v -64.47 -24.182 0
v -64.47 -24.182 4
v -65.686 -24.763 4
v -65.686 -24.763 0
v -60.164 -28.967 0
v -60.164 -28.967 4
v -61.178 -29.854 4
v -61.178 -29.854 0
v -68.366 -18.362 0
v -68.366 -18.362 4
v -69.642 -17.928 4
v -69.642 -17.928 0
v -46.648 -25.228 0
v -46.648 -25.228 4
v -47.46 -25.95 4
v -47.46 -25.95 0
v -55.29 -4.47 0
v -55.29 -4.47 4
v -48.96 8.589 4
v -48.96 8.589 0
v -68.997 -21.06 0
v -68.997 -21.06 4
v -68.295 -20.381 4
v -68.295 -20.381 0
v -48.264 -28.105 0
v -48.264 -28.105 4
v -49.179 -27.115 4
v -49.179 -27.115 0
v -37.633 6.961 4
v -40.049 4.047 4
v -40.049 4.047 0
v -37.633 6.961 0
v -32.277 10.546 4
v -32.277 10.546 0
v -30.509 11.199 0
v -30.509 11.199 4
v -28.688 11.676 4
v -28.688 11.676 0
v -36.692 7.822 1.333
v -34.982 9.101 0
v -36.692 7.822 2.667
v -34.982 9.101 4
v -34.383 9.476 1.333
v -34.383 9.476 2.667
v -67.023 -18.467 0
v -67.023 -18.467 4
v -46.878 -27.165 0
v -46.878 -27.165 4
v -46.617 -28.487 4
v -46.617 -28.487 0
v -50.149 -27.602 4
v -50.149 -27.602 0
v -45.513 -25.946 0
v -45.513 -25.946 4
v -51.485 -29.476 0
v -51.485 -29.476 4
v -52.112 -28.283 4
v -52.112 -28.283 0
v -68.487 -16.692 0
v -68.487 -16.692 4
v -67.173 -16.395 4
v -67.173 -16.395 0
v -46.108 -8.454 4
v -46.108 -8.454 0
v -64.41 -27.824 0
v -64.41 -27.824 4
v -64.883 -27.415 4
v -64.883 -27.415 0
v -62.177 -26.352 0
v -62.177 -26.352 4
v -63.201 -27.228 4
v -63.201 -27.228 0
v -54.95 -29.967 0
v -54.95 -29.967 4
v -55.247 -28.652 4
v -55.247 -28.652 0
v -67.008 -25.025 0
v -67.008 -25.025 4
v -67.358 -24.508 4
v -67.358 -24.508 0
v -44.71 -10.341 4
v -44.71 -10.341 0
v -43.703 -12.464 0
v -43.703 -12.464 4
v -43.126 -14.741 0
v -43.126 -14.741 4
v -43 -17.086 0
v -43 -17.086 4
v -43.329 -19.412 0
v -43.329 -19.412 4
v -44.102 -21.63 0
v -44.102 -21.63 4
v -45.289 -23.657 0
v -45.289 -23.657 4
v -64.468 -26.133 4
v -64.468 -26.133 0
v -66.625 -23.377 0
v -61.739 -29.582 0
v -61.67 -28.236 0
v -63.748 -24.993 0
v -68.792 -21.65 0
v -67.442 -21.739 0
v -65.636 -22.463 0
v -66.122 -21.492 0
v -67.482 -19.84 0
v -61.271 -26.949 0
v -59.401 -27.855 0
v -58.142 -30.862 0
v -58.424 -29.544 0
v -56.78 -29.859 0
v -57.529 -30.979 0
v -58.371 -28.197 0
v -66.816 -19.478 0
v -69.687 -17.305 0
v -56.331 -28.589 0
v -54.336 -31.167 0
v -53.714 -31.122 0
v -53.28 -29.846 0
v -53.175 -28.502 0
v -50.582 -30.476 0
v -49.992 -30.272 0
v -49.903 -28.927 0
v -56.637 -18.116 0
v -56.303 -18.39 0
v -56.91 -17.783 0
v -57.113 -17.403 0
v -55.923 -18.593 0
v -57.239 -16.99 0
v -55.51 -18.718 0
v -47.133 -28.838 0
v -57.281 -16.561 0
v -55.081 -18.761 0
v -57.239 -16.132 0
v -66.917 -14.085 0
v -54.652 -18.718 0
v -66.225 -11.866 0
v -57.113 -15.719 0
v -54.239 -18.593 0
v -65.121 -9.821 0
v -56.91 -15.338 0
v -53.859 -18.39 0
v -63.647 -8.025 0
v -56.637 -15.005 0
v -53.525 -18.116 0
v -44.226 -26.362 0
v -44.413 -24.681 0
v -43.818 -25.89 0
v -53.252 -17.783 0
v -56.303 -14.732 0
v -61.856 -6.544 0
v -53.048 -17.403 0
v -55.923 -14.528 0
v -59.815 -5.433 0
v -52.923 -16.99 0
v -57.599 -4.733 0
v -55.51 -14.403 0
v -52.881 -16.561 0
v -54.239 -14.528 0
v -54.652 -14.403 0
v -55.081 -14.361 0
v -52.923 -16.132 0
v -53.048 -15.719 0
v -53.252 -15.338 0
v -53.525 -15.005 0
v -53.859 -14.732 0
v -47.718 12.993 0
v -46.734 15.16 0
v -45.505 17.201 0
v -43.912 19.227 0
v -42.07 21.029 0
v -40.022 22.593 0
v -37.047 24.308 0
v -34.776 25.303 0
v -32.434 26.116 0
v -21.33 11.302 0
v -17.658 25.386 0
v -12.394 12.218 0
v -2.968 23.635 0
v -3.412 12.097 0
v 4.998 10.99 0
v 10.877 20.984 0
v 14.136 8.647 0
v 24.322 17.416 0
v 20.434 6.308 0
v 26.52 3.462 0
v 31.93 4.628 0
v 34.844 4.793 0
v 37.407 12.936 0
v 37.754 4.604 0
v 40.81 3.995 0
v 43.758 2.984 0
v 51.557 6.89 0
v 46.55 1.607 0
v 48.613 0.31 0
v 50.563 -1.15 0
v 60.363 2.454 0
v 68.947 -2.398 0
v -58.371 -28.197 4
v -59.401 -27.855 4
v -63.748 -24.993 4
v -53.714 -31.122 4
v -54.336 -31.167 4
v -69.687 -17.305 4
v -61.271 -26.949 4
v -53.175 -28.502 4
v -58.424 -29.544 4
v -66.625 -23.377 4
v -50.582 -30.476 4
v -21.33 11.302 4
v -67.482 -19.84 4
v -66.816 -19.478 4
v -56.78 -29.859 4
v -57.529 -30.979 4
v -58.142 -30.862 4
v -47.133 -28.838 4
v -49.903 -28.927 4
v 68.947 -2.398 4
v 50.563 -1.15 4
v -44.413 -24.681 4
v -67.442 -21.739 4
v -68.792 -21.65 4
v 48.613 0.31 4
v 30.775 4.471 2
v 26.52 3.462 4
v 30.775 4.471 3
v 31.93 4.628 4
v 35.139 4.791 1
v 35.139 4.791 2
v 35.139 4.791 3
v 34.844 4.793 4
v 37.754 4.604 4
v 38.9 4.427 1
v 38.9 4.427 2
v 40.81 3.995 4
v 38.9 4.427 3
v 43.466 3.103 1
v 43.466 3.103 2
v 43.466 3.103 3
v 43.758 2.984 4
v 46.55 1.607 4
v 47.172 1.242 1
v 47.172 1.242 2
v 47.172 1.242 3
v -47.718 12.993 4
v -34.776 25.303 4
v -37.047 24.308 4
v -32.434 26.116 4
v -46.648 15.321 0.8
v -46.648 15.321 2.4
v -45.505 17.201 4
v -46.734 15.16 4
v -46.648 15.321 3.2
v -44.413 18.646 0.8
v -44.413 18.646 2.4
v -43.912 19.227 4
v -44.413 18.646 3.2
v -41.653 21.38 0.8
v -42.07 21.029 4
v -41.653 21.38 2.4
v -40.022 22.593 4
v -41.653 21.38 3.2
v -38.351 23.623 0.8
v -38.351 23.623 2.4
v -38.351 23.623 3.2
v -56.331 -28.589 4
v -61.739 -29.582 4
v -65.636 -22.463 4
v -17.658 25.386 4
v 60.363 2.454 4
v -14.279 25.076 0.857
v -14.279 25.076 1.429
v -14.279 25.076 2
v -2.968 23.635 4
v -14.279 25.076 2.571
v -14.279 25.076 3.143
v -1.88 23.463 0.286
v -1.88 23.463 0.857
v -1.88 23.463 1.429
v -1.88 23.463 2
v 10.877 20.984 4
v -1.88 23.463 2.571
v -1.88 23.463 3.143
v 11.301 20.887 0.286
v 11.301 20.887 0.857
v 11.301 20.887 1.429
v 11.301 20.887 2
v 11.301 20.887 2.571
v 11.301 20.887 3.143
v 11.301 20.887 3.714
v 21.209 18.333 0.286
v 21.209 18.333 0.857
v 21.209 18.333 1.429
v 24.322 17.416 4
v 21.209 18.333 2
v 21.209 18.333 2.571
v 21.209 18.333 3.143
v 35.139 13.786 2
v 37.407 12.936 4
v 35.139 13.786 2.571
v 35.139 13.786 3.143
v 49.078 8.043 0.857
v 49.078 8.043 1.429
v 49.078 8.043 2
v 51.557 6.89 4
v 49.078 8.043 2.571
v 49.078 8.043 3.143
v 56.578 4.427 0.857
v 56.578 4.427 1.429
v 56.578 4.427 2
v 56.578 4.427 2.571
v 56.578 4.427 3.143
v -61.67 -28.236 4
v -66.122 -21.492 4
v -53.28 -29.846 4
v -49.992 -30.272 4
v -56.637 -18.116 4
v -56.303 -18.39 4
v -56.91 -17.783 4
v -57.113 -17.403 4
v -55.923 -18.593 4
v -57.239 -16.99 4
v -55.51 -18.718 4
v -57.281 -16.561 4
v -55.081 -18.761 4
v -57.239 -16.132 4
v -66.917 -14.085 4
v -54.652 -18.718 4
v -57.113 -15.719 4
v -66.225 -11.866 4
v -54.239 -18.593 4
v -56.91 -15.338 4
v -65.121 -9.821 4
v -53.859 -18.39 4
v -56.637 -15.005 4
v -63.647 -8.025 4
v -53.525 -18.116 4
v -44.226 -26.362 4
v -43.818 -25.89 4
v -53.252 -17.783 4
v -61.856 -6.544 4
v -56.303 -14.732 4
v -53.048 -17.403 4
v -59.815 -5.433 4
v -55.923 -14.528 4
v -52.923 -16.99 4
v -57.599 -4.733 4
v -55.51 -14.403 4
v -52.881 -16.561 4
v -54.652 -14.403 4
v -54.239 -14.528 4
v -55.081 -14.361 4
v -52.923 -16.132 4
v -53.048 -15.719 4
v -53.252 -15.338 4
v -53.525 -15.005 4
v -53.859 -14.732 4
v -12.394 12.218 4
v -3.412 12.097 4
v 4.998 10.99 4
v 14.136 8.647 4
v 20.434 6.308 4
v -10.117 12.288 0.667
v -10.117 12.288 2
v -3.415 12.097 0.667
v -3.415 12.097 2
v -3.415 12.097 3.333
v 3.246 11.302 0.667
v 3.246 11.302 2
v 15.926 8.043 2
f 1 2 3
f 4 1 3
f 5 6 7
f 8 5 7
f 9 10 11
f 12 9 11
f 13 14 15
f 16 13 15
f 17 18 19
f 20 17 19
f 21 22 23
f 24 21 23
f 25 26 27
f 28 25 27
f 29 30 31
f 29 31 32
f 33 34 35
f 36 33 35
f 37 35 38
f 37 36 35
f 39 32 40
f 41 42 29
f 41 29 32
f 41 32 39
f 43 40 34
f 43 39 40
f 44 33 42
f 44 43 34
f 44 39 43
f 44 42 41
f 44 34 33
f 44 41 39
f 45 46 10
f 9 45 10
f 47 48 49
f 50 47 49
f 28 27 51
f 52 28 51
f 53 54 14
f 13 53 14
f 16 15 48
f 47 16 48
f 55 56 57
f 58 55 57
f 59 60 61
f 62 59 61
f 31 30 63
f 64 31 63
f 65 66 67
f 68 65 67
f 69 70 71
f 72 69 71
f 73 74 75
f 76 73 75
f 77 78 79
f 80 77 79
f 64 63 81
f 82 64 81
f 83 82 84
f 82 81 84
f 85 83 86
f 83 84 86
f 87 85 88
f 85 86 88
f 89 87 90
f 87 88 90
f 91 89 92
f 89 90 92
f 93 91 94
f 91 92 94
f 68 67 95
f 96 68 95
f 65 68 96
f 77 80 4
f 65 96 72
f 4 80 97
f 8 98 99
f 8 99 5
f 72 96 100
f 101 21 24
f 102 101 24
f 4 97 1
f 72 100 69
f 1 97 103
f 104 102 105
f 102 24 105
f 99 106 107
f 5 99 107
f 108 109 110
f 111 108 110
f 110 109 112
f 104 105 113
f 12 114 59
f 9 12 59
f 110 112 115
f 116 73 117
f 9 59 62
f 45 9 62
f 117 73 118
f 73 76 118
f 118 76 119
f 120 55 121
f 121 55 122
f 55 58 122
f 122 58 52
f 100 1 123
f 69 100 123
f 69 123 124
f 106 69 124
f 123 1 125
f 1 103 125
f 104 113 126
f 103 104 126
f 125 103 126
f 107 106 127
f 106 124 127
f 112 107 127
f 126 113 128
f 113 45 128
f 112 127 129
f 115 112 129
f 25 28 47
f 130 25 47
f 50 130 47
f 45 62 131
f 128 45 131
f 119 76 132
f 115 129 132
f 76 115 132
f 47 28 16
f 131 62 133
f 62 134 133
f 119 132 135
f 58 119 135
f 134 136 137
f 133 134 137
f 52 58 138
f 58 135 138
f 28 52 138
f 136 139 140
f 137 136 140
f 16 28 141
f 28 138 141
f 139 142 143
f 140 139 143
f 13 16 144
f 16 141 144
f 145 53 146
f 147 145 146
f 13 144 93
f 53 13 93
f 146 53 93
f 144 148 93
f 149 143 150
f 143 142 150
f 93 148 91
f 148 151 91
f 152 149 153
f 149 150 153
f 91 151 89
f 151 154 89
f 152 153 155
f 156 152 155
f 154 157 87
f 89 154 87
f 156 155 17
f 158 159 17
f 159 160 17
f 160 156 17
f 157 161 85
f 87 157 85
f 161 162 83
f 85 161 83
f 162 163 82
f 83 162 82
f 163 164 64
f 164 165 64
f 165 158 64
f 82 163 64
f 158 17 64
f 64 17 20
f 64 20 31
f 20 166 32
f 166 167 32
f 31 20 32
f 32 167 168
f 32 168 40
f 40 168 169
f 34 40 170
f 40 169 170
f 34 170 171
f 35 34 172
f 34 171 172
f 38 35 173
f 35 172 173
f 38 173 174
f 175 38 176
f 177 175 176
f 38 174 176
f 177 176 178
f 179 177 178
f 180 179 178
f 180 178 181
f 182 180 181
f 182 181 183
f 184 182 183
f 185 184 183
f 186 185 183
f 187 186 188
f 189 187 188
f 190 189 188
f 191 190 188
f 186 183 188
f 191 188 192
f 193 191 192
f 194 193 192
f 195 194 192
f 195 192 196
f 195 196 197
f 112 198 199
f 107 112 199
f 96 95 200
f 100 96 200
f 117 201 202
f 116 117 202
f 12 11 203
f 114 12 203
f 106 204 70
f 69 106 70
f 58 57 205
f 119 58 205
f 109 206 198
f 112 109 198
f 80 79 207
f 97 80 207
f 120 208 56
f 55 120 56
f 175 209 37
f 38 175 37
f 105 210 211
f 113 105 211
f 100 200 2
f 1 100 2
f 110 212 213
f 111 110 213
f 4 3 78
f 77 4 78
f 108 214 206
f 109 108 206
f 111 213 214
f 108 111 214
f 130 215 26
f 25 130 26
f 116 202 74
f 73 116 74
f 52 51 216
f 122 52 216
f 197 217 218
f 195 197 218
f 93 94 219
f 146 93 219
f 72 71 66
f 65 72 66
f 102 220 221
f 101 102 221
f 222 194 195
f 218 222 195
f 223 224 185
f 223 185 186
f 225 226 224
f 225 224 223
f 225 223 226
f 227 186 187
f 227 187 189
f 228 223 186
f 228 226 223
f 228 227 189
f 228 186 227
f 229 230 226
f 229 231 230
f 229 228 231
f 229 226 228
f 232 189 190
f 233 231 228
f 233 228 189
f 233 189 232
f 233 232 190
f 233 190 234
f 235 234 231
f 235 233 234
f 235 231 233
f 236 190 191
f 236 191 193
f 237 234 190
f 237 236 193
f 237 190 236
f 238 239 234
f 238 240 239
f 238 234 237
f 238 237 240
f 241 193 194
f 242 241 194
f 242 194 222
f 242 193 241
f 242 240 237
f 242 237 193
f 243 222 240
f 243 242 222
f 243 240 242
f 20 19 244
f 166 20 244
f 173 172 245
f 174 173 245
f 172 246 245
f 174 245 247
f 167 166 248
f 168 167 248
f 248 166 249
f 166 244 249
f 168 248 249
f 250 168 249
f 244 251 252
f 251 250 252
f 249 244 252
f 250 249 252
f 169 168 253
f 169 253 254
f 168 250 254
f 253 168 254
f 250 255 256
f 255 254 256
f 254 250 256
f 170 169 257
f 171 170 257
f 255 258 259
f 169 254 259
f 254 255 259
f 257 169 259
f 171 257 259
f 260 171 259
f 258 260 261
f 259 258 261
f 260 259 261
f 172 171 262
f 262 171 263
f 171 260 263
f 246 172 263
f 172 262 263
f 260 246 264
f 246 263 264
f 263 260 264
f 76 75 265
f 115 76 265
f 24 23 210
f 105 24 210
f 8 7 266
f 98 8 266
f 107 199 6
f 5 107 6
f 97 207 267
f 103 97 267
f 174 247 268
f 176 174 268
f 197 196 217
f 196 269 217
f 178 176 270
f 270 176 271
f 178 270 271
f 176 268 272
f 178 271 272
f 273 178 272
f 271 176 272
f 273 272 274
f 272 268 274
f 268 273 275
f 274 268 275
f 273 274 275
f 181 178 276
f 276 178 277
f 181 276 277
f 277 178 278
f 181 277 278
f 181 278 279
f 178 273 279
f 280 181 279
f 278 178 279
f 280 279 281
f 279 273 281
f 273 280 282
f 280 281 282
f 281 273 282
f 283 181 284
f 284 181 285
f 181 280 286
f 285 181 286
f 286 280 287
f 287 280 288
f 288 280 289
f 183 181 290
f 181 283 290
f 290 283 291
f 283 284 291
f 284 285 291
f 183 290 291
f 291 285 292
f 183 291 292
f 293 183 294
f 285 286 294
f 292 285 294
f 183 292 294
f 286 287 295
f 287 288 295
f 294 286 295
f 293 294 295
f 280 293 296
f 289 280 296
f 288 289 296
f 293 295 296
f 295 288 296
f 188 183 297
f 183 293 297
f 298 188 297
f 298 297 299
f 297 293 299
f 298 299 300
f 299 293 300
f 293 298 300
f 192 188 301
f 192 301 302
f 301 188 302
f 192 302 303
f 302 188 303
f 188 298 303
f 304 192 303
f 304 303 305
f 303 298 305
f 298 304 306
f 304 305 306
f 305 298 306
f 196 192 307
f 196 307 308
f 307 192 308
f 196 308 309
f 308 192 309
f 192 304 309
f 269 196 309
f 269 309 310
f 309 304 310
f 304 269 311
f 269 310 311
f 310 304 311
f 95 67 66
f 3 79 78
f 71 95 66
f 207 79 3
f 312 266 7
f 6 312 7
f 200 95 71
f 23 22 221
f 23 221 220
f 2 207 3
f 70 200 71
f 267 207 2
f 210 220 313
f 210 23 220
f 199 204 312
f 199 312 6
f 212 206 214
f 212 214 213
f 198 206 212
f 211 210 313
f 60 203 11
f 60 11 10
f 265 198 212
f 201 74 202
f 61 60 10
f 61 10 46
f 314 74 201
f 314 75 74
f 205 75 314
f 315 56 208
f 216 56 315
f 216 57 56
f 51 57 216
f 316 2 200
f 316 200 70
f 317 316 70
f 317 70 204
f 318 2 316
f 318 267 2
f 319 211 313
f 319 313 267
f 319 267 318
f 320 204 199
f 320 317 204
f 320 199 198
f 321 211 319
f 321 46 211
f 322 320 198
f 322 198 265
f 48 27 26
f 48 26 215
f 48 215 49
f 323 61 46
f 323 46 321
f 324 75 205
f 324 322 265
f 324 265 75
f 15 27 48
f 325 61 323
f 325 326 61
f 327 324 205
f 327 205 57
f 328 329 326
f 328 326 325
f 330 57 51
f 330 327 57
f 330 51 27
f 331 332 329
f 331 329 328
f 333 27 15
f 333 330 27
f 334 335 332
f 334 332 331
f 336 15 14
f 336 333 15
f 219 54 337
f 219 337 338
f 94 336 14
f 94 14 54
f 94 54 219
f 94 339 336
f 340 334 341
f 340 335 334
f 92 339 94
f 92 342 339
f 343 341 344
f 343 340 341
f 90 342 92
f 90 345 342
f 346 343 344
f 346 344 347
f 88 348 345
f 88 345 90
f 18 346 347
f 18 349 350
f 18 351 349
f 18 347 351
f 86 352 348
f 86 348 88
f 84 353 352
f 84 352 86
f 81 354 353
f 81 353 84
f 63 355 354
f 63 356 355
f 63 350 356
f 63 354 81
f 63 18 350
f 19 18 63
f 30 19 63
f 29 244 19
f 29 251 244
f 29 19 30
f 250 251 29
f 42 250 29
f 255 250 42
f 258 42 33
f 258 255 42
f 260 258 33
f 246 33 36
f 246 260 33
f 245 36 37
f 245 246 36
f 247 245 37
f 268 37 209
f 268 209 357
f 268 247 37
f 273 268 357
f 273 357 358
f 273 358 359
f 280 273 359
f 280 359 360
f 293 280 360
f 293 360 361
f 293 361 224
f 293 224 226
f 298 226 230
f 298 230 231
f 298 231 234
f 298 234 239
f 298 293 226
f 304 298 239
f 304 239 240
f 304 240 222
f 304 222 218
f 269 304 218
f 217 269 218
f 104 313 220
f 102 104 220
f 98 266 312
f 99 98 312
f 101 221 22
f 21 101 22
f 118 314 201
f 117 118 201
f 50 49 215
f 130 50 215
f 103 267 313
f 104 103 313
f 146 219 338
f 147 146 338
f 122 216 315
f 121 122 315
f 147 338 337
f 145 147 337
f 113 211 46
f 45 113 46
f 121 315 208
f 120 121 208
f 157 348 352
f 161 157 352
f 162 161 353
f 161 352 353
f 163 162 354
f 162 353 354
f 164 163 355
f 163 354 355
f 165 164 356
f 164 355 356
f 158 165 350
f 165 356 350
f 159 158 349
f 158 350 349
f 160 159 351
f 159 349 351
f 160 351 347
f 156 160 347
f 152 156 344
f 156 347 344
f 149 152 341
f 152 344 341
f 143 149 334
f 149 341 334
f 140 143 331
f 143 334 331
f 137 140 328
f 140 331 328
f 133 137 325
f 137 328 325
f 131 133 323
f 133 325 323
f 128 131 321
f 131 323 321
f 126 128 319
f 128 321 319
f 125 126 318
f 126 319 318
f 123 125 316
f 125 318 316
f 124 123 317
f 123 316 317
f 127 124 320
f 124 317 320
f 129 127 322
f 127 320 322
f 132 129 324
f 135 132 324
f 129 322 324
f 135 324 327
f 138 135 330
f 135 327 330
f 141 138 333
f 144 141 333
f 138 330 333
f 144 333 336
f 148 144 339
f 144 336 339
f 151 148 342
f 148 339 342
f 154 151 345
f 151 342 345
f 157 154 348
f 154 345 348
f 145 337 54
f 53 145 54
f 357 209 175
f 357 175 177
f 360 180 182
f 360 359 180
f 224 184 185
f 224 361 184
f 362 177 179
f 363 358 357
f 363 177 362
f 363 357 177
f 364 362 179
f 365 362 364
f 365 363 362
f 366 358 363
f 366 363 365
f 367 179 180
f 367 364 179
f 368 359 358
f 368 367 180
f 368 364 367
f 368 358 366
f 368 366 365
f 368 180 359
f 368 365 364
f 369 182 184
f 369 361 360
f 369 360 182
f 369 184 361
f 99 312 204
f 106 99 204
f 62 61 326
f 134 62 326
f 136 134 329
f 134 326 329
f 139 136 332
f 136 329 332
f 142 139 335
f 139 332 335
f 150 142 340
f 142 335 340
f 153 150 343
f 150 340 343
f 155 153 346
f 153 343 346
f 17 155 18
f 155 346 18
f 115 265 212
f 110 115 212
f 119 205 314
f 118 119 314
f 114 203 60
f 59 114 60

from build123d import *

# Parameters (mm, degrees)
SKETCH1_W           = 150
SKETCH1_H           = 70
BOSS_EXTRUDE2_DEPTH = 4
SKETCH3_W           = 150
SKETCH3_H           = 70
SKETCH3_R           = 2.2
CUT_EXTRUDE2_DEPTH  = 4


with BuildPart() as part:
    # Sketch1 → Boss-Extrude2 (new body)
    with BuildSketch(Plane.XY):
        Rectangle(SKETCH1_W, SKETCH1_H)
    extrude(amount=BOSS_EXTRUDE2_DEPTH)

    # Sketch3 → Cut-Extrude2 (cut)
    # profile 1 of 2: a face of its own
    with BuildSketch(Plane.XY.offset(4)):
        Rectangle(SKETCH3_W, SKETCH3_H)
        with BuildLine():
            Line((-40.048699904, 4.047442221), (-46.108056892, -8.453831345))
            ThreePointArc((-46.108056892, -8.453831345), (-43.005686407, -15.910387786), (-45.28923235, -23.657022831))
            Line((-45.28923235, -23.657022831), (-44.413257795, -24.68114801))
            Line((-44.413257795, -24.68114801), (-43.818150486, -25.890284518))
            Line((-43.818150486, -25.890284518), (-44.226488656, -26.36235802))
            Line((-44.226488656, -26.36235802), (-45.513146968, -25.945538135))
            Line((-45.513146968, -25.945538135), (-46.648345309, -25.228272501))
            Line((-46.648345309, -25.228272501), (-47.459528308, -25.949502265))
            Line((-47.459528308, -25.949502265), (-46.878464963, -27.165450123))
            Line((-46.878464963, -27.165450123), (-46.616583, -28.487411409))
            Line((-46.616583, -28.487411409), (-47.133188997, -28.837713701))
            Line((-47.133188997, -28.837713701), (-48.264395233, -28.105227349))
            Line((-48.264395233, -28.105227349), (-49.178999955, -27.115448583))
            Line((-49.178999955, -27.115448583), (-50.149210562, -27.60215343))
            Line((-50.149210562, -27.60215343), (-49.902656934, -28.927059129))
            Line((-49.902656934, -28.927059129), (-49.991847141, -30.271755716))
            Line((-49.991847141, -30.271755716), (-50.581515119, -30.476414277))
            Line((-50.581515119, -30.476414277), (-51.484595019, -29.476109074))
            Line((-51.484595019, -29.476109074), (-52.111861746, -28.28333908))
            Line((-52.111861746, -28.28333908), (-53.174981712, -28.502350879))
            Line((-53.174981712, -28.502350879), (-53.279740023, -29.845924286))
            Line((-53.279740023, -29.845924286), (-53.713924234, -31.121717324))
            Line((-53.713924234, -31.121717324), (-54.336469297, -31.16678501))
            Line((-54.336469297, -31.16678501), (-54.949879458, -29.966830103))
            Line((-54.949879458, -29.966830103), (-55.247060998, -28.652354186))
            Line((-55.247060998, -28.652354186), (-56.330640455, -28.588747644))
            Line((-56.330640455, -28.588747644), (-56.779571599, -29.859426451))
            Line((-56.779571599, -29.859426451), (-57.529160877, -30.979372753))
            Line((-57.529160877, -30.979372753), (-58.142157607, -30.861778276))
            Line((-58.142157607, -30.861778276), (-58.424095141, -29.543948609))
            Line((-58.424095141, -29.543948609), (-58.370939064, -28.19734613))
            Line((-58.370939064, -28.19734613), (-59.401133862, -27.855455928))
            Line((-59.401133862, -27.855455928), (-60.163643923, -28.966645475))
            Line((-60.163643923, -28.966645475), (-61.177554999, -29.85442255))
            Line((-61.177554999, -29.85442255), (-61.739228681, -29.58217978))
            Line((-61.739228681, -29.58217978), (-61.67048001, -28.236283266))
            Line((-61.67048001, -28.236283266), (-61.270608815, -26.94932296))
            Line((-61.270608815, -26.94932296), (-62.177212881, -26.35244835))
            Line((-62.177212881, -26.35244835), (-63.20133806, -27.228422905))
            Line((-63.20133806, -27.228422905), (-64.410474568, -27.823530214))
            Line((-64.410474568, -27.823530214), (-64.88254807, -27.415192045))
            Line((-64.88254807, -27.415192045), (-64.467798303, -26.132949308))
            Line((-64.467798303, -26.132949308), (-63.748462551, -24.993335391))
            Line((-63.748462551, -24.993335391), (-64.469692315, -24.182152392))
            Line((-64.469692315, -24.182152392), (-65.685640173, -24.763215738))
            Line((-65.685640173, -24.763215738), (-67.007601459, -25.0250977))
            Line((-67.007601459, -25.0250977), (-67.357903751, -24.508491703))
            Line((-67.357903751, -24.508491703), (-66.625417399, -23.377285468))
            Line((-66.625417399, -23.377285468), (-65.635638633, -22.462680745))
            Line((-65.635638633, -22.462680745), (-66.12234348, -21.492470138))
            Line((-66.12234348, -21.492470138), (-67.442381009, -21.7387346))
            Line((-67.442381009, -21.7387346), (-68.791945766, -21.64983356))
            Line((-68.791945766, -21.64983356), (-68.996604326, -21.060165581))
            Line((-68.996604326, -21.060165581), (-68.294889193, -20.381180819))
            Line((-68.294889193, -20.381180819), (-67.482373775, -19.839661539))
            Line((-67.482373775, -19.839661539), (-66.816485533, -19.478186849))
            Line((-66.816485533, -19.478186849), (-67.022540929, -18.466698988))
            Line((-67.022540929, -18.466698988), (-68.366114336, -18.361940677))
            Line((-68.366114336, -18.361940677), (-69.641907373, -17.927756466))
            Line((-69.641907373, -17.927756466), (-69.686975059, -17.305211404))
            Line((-69.686975059, -17.305211404), (-68.487020153, -16.691801242))
            Line((-68.487020153, -16.691801242), (-67.172544236, -16.394619702))
            ThreePointArc((-67.172544236, -16.394619702), (-63.64688388, -8.024989426), (-55.28975466, -4.46979842))
            Line((-55.28975466, -4.46979842), (-48.960156028, 8.589020233))
            add(Edge.make_bspline(
                [(-48.960156028, 8.589020233), (-48.525006522, 10.927165739), (-47.35149279, 14.508267826), (-44.541733346, 18.700915308), (-41.70241199, 21.497827932), (-37.723307758, 24.171360097), (-34.481102631, 25.48662902), (-32.433692057, 26.115600859)],
                knots=[0, 0, 0, 0, 0.280484778, 0.43789933, 0.59054437, 0.747359112, 1, 1, 1, 1], degree=3))
            add(Edge.make_bspline(
                [(-32.433692057, 26.115600859), (-28.448350382, 26.052294796), (-22.388276441, 25.79501109), (-14.18632606, 25.099065372), (-7.980885192, 24.383393074), (-1.110987429, 23.380058501), (5.264634034, 22.218898308), (11.43367036, 20.880453465), (16.402139506, 19.662857342), (22.10004856, 18.109153747), (28.279984557, 16.21636129), (35.058120911, 13.860560362), (41.973959107, 11.177047788), (49.136462176, 8.079253646), (58.345885409, 3.636427486), (64.90236683, 0.015251198), (68.946713794, -2.398269379)],
                knots=[0, 0, 0, 0, 0.11222622, 0.17070992, 0.231734086, 0.288076483, 0.366168217, 0.41414212, 0.465798372, 0.51018096, 0.580417809, 0.647733458, 0.712181991, 0.789246486, 0.867392559, 1, 1, 1, 1], degree=3))
            Line((68.946713794, -2.398269379), (50.562544476, -1.150188957))
            add(Edge.make_bspline(
                [(26.520048265, 3.462013086), (29.293489487, 4.336232341), (33.485930617, 5.05031742), (39.24295286, 4.499555321), (44.670037704, 2.915159356), (48.414632414, 0.591836573), (50.562544476, -1.150188957)],
                knots=[0, 0, 0, 0, 0.341962237, 0.48968945, 0.675604444, 1, 1, 1, 1], degree=3))
            add(Edge.make_bspline(
                [(-21.330405303, 11.302406164), (-17.622374152, 11.890988565), (-11.639608099, 12.429319103), (-3.406309539, 12.197655156), (3.469773129, 11.378136184), (9.934529618, 9.974382339), (17.791223488, 7.5394651), (23.098719892, 5.22837296), (26.520048265, 3.462013086)],
                knots=[0, 0, 0, 0, 0.228338819, 0.364248885, 0.500229999, 0.648901093, 0.76588379, 1, 1, 1, 1], degree=3))
            Line((-21.330405303, 11.302406164), (-28.688467899, 11.676006226))
            add(Edge.make_bspline(
                [(-40.048699904, 4.047442221), (-39.103951171, 5.443155397), (-37.347958886, 7.448598356), (-33.529265799, 10.184902808), (-30.685080402, 11.252838939), (-28.688467899, 11.676006226)],
                knots=[0, 0, 0, 0, 0.360825947, 0.563283509, 1, 1, 1, 1], degree=3))
        make_face(mode=Mode.SUBTRACT)
    # profile 2 of 2: a face of its own
    with BuildSketch(Plane.XY.offset(4)):
        with Locations((-55.080935375, -16.560745325)):
            Circle(SKETCH3_R)
    extrude(amount=-CUT_EXTRUDE2_DEPTH, mode=Mode.SUBTRACT)


solid = part.part
